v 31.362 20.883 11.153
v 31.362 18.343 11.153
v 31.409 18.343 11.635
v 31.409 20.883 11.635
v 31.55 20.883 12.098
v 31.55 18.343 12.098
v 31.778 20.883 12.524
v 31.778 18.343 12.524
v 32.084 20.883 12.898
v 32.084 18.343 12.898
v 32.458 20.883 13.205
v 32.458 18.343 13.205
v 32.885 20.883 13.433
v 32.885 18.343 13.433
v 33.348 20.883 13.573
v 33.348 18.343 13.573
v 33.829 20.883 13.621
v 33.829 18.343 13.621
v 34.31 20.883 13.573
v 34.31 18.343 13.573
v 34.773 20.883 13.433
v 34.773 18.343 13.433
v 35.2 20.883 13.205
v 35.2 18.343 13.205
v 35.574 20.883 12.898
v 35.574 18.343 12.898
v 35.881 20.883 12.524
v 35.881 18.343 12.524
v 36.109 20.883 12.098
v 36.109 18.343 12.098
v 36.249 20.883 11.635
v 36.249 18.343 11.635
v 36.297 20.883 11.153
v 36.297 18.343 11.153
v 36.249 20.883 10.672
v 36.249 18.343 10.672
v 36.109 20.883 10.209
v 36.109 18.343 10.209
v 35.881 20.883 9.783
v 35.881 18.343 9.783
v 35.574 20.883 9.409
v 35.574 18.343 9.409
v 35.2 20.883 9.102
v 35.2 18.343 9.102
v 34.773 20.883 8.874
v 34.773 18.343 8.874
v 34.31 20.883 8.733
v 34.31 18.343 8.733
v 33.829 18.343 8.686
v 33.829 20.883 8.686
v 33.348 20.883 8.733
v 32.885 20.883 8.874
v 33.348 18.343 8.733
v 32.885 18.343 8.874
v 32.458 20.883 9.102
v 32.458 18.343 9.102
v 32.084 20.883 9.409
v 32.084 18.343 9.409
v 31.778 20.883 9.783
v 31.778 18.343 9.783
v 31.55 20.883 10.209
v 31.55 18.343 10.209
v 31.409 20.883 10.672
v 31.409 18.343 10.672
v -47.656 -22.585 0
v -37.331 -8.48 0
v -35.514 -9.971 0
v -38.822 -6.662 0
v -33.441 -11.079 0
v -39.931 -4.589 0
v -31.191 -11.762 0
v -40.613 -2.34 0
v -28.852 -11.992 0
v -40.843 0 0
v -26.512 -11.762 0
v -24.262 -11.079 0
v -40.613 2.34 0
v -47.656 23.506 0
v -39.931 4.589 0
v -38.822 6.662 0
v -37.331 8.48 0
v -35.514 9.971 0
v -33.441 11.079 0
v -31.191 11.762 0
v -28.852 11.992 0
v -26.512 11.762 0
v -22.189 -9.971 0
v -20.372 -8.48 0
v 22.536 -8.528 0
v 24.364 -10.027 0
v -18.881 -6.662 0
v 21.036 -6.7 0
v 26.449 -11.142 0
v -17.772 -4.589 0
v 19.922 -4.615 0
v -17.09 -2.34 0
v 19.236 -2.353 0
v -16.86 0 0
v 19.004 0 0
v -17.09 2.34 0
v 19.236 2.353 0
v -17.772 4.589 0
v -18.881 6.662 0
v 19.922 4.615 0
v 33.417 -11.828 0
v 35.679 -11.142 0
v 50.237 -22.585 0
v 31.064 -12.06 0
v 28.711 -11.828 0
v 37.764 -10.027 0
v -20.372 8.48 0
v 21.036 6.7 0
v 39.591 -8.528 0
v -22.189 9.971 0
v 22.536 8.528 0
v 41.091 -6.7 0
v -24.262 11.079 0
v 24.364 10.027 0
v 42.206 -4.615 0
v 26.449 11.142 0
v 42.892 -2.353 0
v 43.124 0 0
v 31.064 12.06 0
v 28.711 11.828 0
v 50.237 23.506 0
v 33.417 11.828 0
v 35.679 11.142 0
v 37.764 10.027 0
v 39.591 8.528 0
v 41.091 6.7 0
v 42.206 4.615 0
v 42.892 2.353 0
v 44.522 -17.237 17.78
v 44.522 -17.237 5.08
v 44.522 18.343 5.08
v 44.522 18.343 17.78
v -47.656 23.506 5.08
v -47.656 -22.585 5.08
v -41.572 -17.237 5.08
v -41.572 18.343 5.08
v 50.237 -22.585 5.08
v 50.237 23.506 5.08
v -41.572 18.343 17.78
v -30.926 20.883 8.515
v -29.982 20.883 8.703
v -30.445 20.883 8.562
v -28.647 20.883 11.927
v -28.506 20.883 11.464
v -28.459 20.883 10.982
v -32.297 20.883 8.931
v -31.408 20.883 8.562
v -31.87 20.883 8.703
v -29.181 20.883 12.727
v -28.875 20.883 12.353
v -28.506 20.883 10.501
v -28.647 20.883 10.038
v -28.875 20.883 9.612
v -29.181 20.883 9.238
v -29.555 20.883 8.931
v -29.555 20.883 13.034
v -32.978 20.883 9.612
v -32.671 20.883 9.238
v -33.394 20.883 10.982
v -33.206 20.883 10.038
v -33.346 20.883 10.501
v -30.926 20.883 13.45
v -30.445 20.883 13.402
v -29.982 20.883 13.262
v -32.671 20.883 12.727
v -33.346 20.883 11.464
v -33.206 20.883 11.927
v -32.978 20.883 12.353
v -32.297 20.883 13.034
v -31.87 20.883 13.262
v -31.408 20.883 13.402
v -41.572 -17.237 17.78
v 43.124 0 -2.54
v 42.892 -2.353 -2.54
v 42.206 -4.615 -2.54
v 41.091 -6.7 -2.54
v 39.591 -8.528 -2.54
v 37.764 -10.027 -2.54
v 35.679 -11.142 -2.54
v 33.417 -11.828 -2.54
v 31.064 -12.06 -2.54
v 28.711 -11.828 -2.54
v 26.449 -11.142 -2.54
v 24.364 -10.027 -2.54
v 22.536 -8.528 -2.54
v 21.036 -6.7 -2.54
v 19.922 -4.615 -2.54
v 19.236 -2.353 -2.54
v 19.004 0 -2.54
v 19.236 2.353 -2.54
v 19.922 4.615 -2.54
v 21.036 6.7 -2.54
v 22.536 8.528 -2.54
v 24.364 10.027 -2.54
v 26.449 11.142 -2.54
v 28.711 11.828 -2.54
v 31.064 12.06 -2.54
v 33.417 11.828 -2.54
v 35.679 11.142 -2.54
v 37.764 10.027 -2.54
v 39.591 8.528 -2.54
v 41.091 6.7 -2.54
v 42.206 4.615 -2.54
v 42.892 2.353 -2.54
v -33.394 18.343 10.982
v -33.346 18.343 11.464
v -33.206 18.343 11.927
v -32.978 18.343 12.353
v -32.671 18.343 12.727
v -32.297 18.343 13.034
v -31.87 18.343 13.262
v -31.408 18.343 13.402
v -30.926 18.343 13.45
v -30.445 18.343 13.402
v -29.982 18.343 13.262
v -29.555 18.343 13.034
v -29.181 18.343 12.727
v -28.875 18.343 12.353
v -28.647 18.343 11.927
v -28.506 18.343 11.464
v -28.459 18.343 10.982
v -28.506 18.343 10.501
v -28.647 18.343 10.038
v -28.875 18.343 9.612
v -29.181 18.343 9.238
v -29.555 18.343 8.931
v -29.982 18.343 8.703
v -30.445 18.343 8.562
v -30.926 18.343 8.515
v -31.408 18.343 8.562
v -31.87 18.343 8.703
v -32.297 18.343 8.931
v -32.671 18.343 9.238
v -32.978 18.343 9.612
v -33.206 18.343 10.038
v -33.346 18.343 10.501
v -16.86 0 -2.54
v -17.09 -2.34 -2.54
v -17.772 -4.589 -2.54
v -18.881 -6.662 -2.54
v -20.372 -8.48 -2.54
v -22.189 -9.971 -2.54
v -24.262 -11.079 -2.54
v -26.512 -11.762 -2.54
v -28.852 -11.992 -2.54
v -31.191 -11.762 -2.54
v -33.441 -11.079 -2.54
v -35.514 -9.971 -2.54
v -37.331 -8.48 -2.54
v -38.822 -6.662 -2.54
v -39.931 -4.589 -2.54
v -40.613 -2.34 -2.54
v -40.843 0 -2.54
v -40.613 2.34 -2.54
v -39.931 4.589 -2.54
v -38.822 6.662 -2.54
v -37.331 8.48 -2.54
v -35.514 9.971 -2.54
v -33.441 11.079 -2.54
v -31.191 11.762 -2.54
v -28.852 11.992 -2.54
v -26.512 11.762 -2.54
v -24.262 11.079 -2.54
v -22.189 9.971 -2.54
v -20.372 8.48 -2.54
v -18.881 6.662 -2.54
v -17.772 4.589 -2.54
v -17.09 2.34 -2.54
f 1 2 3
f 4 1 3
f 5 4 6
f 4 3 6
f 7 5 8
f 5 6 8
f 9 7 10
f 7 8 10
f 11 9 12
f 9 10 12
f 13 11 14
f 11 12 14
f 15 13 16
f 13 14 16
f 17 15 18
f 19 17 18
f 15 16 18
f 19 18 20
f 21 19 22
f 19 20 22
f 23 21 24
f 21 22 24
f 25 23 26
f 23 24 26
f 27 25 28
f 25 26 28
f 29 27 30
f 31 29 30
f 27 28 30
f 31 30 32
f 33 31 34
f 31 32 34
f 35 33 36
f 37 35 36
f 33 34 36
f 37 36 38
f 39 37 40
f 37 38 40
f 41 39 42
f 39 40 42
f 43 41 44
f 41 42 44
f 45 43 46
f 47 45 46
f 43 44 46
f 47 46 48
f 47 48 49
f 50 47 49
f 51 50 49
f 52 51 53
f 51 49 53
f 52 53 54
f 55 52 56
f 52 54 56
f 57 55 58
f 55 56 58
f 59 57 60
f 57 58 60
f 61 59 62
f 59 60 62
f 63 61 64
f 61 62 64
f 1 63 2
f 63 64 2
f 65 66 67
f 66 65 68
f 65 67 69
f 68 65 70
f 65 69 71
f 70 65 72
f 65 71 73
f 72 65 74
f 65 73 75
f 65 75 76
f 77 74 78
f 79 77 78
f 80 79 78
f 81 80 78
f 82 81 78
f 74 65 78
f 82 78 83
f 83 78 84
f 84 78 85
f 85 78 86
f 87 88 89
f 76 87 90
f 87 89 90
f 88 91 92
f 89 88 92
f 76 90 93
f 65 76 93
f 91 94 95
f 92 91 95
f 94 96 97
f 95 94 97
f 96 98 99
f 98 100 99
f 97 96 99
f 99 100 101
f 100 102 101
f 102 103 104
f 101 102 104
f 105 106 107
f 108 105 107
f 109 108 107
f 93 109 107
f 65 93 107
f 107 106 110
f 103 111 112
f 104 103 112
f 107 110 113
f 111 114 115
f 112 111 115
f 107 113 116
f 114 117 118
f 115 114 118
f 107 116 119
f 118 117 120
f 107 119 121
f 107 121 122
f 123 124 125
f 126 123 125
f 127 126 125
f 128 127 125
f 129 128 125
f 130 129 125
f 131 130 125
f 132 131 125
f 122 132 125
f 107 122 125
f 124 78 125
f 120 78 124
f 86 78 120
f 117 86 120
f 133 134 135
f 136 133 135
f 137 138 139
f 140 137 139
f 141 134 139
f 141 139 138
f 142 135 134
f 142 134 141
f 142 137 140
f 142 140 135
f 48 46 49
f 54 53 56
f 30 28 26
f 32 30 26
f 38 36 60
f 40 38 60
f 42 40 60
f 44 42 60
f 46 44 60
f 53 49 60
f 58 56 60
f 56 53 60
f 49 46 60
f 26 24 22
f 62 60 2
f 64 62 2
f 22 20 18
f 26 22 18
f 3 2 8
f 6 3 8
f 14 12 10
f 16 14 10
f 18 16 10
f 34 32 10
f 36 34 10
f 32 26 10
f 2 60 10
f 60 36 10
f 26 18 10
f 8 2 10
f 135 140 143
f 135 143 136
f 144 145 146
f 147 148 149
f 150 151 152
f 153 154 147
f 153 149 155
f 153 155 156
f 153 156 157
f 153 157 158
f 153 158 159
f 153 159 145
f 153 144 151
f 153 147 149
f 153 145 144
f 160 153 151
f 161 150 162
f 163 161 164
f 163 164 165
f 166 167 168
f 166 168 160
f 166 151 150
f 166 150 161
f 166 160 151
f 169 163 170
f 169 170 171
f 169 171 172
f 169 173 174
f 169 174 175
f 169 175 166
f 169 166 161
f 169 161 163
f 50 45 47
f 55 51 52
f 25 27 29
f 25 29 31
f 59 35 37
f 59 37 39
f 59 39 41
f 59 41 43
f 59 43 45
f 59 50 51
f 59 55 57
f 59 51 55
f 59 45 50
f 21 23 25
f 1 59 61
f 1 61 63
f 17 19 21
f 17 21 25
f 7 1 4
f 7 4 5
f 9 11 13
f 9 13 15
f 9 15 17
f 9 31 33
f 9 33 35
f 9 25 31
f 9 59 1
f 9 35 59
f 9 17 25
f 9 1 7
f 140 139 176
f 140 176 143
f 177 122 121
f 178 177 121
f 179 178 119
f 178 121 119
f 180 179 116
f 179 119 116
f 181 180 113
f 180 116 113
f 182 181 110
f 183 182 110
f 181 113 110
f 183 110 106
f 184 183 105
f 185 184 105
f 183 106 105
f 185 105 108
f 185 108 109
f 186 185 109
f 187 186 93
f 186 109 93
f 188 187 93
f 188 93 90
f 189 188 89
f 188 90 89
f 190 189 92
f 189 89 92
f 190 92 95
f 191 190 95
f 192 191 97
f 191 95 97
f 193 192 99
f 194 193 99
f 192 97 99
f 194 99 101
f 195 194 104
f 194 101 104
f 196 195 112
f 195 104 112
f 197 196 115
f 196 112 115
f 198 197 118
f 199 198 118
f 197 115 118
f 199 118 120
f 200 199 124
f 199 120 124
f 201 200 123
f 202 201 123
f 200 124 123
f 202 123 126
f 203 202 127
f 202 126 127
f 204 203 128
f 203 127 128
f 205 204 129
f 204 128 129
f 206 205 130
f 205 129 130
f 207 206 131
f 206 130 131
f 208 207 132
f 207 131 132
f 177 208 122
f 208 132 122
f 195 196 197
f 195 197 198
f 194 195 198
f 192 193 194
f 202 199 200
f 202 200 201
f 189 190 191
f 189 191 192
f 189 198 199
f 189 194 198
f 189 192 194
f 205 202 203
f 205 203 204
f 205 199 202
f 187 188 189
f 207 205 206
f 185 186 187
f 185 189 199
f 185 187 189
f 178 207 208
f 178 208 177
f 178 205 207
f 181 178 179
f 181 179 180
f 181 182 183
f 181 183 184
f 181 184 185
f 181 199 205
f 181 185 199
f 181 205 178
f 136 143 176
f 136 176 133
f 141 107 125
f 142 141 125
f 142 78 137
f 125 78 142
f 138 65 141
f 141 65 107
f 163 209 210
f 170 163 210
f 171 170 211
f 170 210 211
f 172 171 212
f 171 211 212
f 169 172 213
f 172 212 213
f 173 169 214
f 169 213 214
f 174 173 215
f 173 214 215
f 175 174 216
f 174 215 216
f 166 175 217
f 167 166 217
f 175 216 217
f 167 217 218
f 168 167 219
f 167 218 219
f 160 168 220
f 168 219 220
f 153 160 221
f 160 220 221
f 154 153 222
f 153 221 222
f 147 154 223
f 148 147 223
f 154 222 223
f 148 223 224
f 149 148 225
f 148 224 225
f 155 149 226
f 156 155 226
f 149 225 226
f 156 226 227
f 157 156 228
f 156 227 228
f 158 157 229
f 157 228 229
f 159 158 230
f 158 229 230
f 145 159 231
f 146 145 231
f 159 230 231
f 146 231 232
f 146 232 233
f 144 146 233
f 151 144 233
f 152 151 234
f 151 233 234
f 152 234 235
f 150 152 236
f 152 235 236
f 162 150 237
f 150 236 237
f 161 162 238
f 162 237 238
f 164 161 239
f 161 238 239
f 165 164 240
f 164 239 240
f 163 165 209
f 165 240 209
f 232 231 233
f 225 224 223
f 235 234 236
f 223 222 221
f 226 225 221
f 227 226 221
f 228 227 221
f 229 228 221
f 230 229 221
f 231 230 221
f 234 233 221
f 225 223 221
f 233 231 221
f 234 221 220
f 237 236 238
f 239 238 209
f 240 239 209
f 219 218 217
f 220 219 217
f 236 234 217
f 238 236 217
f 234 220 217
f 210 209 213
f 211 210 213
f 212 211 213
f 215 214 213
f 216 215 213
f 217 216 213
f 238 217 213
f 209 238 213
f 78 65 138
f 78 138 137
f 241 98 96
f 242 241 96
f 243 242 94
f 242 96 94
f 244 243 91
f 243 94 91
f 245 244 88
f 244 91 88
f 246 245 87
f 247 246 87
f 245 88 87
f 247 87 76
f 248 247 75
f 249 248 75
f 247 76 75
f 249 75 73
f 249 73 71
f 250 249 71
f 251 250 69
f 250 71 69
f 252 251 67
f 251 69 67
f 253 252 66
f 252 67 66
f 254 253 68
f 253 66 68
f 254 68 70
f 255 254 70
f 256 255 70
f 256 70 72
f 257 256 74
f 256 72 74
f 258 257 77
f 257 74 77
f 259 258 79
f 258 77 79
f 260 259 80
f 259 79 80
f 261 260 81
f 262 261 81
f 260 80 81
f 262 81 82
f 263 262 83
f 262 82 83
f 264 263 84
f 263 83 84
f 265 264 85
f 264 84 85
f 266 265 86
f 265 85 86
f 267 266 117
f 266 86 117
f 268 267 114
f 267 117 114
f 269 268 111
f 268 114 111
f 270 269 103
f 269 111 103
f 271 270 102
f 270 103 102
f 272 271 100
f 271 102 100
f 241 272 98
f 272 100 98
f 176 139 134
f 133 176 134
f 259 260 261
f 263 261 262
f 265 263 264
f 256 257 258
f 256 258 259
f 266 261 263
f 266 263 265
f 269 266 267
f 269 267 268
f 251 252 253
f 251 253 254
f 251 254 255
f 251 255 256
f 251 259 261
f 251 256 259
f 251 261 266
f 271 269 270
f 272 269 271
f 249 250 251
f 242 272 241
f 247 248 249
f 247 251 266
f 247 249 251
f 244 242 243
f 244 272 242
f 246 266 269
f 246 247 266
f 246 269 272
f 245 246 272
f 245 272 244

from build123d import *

# Parameters (mm, degrees)
F0_W     = 97.892423
F0_H     = 46.090555
F1_DEPTH = 5.08
F2_W     = 86.093713
F2_H     = 35.580484
F3_DEPTH = 12.7
F4_R     = 11.991925
F4_R_2   = 12.059751
F5_DEPTH = 2.54
F6_R     = 2.467434
F7_DEPTH = 2.54


with BuildPart() as f1:
    # F0 (on Top) → F1 (new body)
    with BuildSketch(Plane.XY):
        with Locations((1.290484, 0.460411)):
            Rectangle(F0_W, F0_H)
    extrude(amount=F1_DEPTH)

    # F2 (on face) → F3 (join)
    with BuildSketch(Plane.XY.offset(5.08)):
        with Locations((1.47484, 0.553065)):
            Rectangle(F2_W, F2_H)
    extrude(amount=F3_DEPTH)

    # F4 (on face) → F5 (join)
    with BuildSketch(Plane(origin=(0, 0, 0), x_dir=(1, 0, 0), z_dir=(0, 0, -1))):
        with Locations((-28.851533, 0)):
            Circle(F4_R)
        with Locations((31.06379, 0)):
            Circle(F4_R_2)
    extrude(amount=F5_DEPTH)


with BuildPart() as f7:
    # F6 (on face) → F7 (new body)
    with BuildSketch(Plane(origin=(0, 18.343307, 0), x_dir=(-1, 0, 0), z_dir=(0, 1, 0))):
        with Locations((30.926181, 10.982472)):
            Circle(F6_R)
        with Locations((-33.829112, 11.153467)):
            Circle(F6_R)
    extrude(amount=F7_DEPTH)


solid = Compound([f1.part, f7.part])
